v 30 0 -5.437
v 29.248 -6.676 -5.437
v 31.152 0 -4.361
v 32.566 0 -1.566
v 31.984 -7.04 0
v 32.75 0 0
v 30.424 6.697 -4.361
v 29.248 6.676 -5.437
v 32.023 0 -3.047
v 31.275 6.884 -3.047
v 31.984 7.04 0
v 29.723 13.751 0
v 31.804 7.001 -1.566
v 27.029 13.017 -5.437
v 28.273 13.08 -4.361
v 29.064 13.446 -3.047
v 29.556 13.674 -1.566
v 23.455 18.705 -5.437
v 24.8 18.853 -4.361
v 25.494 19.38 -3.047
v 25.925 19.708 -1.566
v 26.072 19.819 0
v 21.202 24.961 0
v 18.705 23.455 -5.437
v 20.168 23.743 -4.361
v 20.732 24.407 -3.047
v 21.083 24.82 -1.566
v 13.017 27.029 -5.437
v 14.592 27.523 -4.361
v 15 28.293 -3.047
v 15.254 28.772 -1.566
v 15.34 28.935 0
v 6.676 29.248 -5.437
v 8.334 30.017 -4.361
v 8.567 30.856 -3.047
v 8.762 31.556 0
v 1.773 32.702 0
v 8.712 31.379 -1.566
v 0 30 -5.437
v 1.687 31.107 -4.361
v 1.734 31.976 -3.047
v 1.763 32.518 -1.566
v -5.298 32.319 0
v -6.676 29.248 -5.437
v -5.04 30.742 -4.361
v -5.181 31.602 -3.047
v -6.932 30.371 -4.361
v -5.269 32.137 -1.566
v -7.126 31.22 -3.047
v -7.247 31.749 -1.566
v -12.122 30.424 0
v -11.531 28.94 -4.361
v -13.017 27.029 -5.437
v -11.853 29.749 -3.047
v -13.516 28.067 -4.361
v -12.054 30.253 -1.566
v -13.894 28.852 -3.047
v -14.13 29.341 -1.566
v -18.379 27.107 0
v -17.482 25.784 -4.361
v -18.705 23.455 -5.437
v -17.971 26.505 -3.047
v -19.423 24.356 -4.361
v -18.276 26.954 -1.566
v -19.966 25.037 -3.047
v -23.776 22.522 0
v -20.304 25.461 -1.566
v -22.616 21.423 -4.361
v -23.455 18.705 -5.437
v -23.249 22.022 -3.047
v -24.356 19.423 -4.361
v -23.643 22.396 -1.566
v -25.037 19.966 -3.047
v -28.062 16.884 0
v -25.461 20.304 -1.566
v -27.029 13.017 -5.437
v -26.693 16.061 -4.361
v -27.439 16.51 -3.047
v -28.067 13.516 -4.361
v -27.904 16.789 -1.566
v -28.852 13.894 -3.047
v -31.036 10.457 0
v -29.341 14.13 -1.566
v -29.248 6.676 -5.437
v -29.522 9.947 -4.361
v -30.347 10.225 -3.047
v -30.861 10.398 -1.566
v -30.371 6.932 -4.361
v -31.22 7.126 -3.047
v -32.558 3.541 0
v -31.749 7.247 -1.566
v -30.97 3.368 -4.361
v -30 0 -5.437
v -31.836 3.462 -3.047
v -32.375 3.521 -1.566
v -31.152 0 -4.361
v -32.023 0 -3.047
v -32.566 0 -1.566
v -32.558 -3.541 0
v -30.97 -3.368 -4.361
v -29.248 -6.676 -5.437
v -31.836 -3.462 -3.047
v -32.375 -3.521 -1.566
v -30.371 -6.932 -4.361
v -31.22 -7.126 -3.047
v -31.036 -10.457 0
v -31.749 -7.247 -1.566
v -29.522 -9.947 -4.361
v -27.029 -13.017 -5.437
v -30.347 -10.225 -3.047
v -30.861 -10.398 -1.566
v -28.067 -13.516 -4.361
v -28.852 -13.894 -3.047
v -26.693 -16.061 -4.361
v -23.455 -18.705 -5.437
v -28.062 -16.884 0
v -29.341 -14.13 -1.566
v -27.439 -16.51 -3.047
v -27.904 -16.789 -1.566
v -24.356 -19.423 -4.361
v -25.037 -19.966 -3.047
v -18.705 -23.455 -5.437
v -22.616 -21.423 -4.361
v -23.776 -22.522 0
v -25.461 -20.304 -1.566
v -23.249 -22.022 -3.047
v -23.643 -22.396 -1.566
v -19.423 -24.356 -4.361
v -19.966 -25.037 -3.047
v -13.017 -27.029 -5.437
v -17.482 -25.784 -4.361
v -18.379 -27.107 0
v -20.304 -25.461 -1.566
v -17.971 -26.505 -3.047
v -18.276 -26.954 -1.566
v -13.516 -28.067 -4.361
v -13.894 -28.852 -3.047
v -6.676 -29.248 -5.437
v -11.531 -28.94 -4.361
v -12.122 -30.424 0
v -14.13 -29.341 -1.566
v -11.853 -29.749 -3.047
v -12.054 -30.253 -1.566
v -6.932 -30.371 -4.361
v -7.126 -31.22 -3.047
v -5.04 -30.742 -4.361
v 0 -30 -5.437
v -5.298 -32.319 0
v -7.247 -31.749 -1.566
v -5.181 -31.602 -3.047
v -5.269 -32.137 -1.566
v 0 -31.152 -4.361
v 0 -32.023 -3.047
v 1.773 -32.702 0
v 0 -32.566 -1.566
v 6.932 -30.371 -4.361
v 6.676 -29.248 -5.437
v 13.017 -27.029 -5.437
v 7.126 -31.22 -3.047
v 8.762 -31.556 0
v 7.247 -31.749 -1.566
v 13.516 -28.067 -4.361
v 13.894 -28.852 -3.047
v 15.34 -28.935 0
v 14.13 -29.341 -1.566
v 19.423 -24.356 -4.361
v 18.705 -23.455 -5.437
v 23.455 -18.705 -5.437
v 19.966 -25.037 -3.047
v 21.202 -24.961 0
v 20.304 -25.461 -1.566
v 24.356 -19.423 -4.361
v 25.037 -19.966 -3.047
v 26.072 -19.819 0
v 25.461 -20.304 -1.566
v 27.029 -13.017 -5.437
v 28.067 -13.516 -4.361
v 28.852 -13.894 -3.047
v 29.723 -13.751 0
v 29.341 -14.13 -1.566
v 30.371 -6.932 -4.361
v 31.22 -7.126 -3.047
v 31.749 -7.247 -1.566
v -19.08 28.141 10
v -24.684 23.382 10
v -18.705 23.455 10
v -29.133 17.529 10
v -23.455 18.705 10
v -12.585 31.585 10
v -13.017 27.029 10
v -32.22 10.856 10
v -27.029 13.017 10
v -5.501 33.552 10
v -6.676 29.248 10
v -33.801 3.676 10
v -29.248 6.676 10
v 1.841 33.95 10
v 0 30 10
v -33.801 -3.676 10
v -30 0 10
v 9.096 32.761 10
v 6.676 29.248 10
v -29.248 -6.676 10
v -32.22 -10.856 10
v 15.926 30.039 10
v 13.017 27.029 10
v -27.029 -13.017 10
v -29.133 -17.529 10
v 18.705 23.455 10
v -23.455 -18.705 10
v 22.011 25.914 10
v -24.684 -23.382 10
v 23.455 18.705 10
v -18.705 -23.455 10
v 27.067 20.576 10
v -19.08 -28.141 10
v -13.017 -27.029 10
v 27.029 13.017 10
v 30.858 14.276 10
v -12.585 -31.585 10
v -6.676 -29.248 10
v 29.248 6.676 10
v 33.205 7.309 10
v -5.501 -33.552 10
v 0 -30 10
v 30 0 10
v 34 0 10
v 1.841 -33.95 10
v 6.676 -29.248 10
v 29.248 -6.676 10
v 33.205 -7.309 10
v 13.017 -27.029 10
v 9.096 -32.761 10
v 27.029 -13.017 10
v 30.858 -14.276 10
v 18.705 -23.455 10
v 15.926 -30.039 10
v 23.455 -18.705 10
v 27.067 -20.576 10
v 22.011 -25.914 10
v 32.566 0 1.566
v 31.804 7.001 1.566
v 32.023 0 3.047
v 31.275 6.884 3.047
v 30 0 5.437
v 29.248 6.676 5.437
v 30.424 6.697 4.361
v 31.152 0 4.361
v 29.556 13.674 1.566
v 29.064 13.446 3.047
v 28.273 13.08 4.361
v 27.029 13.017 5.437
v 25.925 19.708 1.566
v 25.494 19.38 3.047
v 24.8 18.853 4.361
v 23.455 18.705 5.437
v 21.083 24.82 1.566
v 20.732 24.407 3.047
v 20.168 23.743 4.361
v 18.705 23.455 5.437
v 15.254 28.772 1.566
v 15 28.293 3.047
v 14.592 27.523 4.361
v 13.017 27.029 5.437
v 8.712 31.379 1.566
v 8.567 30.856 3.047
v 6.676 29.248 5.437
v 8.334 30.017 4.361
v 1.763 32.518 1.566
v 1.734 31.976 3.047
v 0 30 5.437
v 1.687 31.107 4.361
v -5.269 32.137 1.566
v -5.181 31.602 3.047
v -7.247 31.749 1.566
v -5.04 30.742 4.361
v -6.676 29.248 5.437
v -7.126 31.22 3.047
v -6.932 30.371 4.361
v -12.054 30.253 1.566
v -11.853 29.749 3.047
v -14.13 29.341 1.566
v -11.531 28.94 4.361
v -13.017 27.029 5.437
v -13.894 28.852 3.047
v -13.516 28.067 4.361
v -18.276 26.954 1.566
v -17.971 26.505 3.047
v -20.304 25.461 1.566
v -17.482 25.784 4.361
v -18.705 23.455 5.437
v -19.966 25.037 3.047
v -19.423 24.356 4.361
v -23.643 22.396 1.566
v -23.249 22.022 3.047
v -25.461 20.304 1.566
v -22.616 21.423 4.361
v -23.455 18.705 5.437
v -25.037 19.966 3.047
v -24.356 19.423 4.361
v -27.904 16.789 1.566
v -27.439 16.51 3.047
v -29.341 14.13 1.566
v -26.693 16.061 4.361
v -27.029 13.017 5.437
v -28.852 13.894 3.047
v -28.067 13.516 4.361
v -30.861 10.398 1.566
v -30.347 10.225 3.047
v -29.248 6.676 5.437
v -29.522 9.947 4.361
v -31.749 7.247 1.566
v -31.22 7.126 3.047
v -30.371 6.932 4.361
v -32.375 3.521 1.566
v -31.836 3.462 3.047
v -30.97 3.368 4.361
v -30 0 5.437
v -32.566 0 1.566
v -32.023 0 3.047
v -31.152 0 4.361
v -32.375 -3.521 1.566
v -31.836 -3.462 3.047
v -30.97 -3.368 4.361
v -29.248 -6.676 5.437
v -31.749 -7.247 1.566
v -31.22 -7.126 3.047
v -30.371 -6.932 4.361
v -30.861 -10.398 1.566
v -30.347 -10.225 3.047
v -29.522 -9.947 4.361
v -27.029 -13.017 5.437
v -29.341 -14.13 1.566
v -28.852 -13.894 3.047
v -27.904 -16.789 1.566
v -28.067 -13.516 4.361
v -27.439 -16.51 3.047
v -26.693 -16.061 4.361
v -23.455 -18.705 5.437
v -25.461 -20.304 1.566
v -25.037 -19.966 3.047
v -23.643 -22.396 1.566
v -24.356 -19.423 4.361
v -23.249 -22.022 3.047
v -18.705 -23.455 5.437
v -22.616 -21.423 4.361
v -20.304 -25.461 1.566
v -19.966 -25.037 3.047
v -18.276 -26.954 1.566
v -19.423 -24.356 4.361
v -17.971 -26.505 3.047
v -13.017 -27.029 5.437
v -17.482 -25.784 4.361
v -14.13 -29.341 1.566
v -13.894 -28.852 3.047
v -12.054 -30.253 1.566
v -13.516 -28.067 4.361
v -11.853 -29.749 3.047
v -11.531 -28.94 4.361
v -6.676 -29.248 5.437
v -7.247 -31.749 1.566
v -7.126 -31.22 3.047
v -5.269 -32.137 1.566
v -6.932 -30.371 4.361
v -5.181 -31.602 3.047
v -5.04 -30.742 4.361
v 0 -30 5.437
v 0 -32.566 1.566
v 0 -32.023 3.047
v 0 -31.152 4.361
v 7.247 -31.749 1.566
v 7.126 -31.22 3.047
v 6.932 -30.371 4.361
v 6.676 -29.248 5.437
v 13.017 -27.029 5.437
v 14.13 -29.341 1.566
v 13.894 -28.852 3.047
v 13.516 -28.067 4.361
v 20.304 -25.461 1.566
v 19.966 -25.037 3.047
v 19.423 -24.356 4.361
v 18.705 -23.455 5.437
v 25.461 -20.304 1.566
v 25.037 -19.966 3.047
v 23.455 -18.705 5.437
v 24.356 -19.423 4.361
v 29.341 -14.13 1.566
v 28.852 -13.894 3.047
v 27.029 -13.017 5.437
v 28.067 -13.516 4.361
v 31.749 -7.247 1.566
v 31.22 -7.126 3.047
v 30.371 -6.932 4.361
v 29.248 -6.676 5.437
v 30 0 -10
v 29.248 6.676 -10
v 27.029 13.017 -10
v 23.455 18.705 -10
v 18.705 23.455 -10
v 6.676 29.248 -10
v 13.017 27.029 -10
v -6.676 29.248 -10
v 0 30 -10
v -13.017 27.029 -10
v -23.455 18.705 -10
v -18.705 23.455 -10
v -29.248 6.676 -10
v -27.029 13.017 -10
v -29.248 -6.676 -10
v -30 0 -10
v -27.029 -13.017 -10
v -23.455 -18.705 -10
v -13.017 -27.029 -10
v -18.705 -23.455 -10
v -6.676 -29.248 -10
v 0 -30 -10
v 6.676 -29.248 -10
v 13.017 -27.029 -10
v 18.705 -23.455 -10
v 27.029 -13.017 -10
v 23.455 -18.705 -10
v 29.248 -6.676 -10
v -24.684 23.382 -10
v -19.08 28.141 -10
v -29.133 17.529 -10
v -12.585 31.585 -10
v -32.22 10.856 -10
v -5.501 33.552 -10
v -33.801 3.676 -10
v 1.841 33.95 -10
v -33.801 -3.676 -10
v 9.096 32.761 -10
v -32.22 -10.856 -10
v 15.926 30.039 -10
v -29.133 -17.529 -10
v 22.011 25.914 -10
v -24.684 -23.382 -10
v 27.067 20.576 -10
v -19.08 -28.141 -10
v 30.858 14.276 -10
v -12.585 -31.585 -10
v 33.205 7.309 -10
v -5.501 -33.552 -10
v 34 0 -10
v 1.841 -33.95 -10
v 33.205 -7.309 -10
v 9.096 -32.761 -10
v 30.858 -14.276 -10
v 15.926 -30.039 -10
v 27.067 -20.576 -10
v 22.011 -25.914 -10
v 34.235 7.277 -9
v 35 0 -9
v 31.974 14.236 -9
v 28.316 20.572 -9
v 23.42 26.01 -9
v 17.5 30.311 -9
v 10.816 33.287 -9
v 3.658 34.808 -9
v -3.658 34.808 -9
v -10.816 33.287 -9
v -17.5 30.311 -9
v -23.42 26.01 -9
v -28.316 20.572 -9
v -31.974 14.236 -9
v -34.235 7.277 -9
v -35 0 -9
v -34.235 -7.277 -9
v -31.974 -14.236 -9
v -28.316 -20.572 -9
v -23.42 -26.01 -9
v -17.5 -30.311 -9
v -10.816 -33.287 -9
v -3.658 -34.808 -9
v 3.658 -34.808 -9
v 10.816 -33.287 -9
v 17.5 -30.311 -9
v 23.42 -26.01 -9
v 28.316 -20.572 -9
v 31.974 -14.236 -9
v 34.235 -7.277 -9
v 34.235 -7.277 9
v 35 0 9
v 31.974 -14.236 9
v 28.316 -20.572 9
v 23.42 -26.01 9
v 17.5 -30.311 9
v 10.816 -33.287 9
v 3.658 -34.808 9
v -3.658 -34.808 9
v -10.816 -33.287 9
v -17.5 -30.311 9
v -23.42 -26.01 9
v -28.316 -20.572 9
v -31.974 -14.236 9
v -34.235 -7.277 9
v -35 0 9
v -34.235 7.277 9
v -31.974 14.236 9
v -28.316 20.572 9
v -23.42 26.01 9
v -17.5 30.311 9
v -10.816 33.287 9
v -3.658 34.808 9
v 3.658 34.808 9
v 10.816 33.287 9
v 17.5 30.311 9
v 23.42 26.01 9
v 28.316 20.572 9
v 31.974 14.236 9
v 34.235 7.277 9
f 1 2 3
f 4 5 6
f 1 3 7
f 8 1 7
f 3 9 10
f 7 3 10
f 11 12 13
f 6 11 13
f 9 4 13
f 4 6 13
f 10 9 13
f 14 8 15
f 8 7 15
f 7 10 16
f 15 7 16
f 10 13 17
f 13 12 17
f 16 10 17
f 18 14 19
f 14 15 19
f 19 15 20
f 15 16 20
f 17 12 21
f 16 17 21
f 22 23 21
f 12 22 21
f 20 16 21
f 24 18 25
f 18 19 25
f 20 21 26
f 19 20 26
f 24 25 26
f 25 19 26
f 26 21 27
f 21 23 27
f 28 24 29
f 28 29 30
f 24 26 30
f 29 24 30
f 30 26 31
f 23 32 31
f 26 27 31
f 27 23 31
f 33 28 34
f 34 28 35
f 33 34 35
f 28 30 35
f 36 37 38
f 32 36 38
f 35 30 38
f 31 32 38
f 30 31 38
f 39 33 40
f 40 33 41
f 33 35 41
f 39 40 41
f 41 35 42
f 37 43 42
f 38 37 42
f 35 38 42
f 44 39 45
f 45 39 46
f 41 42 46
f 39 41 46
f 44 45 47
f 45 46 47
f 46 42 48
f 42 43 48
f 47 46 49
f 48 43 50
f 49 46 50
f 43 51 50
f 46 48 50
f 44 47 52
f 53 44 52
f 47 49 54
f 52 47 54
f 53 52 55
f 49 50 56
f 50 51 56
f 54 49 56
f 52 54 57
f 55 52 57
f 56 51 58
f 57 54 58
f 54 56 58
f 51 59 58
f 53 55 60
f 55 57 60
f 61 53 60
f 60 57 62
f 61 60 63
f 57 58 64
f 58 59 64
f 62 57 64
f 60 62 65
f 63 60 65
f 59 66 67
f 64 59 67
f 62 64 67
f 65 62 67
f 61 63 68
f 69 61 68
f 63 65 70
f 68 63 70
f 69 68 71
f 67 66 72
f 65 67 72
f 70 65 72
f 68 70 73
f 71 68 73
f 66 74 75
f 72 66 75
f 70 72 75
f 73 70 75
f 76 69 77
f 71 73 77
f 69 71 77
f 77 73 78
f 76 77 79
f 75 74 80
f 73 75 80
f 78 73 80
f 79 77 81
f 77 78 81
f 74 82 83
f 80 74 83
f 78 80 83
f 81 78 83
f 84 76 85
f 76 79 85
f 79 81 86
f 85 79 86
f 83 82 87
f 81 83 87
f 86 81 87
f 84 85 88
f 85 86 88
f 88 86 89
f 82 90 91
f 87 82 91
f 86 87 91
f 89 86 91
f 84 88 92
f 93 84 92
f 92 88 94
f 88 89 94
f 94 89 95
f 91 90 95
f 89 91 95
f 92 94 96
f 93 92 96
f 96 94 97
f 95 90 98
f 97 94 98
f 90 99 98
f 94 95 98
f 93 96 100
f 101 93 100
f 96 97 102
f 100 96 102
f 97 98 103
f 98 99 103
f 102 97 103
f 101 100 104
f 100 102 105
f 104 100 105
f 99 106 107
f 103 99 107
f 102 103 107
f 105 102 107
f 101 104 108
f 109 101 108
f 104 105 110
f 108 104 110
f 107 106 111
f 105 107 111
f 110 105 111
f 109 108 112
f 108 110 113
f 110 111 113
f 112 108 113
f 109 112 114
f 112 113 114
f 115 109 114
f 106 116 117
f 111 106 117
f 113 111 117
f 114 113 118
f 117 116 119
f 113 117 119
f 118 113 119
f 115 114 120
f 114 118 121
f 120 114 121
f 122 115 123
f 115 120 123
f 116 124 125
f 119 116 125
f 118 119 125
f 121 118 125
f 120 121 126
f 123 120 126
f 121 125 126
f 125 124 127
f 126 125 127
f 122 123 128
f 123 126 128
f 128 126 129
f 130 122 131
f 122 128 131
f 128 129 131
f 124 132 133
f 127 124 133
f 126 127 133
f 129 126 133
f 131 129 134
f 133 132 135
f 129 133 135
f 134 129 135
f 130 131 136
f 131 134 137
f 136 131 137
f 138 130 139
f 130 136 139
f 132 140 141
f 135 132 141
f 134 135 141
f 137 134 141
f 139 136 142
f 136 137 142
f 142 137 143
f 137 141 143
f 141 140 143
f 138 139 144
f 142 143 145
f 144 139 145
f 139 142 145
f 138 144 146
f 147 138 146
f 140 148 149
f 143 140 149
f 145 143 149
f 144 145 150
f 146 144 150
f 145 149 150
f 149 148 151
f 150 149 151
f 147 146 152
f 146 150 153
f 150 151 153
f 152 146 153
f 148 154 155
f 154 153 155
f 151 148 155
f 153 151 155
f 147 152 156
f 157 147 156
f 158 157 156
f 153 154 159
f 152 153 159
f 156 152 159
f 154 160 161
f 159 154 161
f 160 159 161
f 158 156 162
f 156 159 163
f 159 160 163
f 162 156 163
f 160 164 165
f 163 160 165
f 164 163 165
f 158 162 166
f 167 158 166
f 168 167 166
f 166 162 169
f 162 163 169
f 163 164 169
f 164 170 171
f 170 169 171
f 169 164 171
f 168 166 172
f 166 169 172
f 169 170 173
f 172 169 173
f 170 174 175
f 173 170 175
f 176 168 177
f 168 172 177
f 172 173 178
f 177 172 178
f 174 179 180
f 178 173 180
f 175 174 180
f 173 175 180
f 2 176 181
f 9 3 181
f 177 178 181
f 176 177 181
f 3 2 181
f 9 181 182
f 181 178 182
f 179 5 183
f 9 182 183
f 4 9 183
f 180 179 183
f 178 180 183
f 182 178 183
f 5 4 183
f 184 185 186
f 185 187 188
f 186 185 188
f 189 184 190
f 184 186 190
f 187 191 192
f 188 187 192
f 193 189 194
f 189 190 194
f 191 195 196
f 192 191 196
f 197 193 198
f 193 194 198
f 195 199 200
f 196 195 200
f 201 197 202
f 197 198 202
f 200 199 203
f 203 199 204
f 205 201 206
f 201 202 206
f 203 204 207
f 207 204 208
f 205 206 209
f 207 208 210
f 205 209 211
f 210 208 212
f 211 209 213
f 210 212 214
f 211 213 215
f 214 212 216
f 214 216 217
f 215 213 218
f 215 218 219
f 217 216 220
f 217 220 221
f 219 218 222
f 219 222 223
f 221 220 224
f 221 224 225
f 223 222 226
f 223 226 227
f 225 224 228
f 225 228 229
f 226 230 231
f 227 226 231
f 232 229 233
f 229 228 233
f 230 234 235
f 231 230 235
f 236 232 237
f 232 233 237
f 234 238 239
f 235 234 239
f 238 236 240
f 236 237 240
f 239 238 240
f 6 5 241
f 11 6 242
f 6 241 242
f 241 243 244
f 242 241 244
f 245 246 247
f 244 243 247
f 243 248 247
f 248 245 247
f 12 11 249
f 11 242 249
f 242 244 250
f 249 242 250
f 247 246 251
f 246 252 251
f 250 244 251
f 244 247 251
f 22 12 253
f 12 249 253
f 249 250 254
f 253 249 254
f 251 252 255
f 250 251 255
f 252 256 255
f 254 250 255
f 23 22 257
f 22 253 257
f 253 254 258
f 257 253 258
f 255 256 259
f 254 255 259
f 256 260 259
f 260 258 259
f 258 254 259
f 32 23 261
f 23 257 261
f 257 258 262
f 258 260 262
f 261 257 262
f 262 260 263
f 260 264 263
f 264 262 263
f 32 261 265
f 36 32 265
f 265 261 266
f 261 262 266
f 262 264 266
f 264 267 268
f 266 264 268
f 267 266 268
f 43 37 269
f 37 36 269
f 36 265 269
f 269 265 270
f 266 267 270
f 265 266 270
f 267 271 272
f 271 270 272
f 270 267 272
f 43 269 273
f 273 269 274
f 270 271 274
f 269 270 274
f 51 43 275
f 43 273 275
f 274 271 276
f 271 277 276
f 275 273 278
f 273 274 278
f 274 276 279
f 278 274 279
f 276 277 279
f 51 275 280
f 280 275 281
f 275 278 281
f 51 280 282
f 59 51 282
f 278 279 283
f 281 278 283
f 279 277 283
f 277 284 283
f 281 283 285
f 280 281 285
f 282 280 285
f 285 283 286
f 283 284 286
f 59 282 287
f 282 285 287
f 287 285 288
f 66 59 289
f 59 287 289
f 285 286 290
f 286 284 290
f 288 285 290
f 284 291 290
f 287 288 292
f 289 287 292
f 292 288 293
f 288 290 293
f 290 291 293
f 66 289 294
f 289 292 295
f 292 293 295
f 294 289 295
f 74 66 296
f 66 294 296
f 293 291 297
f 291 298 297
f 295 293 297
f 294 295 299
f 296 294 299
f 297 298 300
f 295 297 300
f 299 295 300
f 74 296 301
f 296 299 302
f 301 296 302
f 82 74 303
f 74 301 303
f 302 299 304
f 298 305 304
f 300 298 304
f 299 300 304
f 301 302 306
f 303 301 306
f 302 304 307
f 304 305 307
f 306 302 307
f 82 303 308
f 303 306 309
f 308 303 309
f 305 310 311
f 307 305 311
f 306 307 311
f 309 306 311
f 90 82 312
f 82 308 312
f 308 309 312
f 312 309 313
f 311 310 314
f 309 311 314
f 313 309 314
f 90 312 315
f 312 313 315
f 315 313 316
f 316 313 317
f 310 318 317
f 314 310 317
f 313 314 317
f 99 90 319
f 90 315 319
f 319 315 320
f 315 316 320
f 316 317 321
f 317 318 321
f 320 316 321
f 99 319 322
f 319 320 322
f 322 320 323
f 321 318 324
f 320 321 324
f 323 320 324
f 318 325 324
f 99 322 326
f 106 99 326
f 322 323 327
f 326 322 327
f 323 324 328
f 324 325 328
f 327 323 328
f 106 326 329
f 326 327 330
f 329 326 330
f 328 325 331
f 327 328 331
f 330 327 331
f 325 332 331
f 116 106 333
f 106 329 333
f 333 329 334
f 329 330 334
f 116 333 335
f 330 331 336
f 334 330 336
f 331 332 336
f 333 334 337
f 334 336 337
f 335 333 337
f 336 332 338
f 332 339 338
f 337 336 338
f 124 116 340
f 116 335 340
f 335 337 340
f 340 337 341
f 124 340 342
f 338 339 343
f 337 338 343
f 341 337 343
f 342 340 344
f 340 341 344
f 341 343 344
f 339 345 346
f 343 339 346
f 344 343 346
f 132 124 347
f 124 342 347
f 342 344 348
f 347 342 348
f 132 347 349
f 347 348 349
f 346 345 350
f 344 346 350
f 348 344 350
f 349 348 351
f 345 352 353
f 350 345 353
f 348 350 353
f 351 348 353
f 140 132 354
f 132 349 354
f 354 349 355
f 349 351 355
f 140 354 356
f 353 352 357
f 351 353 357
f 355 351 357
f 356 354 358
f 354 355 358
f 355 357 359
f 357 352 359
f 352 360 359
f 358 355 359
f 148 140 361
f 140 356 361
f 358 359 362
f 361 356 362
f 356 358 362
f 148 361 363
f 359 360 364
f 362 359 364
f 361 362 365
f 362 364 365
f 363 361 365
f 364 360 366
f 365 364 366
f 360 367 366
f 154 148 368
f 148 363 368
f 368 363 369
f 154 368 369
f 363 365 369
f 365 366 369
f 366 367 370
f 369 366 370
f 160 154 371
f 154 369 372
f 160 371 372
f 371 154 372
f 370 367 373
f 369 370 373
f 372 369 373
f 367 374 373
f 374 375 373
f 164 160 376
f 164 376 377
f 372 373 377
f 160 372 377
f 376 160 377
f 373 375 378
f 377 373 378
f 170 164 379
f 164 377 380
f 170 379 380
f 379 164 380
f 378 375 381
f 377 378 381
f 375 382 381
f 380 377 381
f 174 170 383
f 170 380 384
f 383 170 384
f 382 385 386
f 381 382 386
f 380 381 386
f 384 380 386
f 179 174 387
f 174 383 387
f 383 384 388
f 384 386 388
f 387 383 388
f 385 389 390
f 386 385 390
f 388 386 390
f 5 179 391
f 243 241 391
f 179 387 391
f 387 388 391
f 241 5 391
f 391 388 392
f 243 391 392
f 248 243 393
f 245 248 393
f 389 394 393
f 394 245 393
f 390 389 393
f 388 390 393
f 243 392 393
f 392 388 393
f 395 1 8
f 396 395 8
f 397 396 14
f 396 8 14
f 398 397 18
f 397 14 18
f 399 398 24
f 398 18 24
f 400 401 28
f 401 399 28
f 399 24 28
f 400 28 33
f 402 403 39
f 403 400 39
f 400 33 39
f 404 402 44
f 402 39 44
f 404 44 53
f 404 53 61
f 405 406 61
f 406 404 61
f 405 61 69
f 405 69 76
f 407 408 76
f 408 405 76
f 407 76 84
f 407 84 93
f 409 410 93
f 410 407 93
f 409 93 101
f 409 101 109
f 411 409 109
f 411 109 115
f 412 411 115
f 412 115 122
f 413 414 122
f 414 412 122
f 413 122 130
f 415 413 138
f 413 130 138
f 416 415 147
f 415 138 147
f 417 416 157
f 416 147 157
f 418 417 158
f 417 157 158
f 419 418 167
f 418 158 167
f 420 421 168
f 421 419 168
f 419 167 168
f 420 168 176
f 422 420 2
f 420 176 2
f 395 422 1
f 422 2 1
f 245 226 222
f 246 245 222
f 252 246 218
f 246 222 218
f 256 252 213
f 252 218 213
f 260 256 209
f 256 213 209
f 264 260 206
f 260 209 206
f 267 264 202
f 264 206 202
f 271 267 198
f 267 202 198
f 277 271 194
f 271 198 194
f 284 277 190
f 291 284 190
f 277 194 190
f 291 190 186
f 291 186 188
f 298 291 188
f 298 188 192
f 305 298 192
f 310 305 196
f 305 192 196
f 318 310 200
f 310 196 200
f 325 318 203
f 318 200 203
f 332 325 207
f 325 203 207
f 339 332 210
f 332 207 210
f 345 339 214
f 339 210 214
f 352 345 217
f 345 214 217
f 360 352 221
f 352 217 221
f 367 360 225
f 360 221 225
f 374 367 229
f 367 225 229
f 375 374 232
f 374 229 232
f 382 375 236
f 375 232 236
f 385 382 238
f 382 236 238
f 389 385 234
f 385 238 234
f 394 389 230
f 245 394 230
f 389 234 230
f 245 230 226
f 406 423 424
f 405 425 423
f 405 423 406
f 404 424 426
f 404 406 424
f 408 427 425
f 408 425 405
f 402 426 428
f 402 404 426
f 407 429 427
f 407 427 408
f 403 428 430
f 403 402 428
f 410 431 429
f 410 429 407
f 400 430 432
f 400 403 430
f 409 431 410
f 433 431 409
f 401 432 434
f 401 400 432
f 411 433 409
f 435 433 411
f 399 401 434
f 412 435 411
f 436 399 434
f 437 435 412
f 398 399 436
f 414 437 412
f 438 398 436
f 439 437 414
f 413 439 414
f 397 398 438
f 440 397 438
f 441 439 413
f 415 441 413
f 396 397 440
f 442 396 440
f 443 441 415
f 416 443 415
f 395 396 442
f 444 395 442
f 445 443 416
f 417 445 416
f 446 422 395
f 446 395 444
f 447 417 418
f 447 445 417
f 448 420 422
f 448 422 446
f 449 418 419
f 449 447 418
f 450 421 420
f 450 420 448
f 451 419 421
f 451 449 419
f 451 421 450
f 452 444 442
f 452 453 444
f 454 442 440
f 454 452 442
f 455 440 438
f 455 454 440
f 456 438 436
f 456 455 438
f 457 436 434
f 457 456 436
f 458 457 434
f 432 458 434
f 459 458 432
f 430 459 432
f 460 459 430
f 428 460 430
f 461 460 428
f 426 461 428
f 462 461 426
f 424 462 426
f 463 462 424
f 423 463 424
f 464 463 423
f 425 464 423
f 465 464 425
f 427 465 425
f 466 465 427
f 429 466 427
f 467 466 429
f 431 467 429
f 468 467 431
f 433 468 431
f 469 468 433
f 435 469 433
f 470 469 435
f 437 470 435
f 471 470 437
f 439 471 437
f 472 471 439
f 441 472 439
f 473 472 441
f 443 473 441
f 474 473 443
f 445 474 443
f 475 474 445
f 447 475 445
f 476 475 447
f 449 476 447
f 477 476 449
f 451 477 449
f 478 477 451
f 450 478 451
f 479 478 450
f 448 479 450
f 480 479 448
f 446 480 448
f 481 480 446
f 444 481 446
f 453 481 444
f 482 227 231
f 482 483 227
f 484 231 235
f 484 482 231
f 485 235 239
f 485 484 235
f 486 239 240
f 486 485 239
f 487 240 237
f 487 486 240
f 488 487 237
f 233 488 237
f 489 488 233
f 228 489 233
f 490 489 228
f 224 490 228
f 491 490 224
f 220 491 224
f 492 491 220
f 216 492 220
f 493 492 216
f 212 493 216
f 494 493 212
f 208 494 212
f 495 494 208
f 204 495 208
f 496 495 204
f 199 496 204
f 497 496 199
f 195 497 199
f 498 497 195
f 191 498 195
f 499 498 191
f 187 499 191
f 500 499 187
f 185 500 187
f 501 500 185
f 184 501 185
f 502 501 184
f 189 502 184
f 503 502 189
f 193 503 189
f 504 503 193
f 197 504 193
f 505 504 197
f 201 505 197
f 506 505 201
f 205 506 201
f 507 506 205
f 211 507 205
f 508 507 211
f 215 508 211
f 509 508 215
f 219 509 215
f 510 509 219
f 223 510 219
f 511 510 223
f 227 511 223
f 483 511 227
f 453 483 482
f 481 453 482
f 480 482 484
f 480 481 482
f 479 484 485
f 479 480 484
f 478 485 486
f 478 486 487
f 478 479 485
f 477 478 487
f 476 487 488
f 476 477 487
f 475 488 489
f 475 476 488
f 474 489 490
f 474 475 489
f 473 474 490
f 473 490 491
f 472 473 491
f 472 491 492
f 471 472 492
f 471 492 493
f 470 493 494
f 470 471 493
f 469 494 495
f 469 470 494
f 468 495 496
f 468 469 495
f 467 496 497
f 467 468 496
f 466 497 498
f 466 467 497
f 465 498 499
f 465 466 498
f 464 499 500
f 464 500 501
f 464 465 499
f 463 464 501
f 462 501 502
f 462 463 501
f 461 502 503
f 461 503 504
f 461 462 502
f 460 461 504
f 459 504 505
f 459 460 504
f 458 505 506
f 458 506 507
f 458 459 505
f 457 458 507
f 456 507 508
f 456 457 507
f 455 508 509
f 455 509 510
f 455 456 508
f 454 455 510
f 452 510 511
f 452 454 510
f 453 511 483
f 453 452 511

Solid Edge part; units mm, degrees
sketch "Sketch1" plane through (0, 0, 0) normal (0, -1, 0) x (1, 0, 0)
  line L0 (30, -10) -> (30, 10)
  line L1 (30, 10) -> (35, 10)
  line L2 (35, 10) -> (35, -10)
  line L3 (35, -10) -> (30, -10)
  dimension "D1" = 5
  dimension "D2" = 20
revolve "RevolvedProtrusion1" add sketch "Sketch1" angle 360 about axis through (0, 0, 54) along (0, 0, -1)
sketch "Sketch2" plane through (0, 0, 0) normal (0, -1, 0) x (1, 0, 0)
  circle A0 centre (26, 0) radius 6.75
  dimension "D1" = 26
  dimension "D2" = 13.5
revolve "RevolvedCutout1" cut sketch "Sketch2" angle 360 about axis through (0, 0, 54) along (0, 0, -1)
chamfer "Chamfer1" distance 1 angle 45 2 edges at (-35, 0, 10) (-35, 0, -10)
properties material "Polyethylene, low density"
